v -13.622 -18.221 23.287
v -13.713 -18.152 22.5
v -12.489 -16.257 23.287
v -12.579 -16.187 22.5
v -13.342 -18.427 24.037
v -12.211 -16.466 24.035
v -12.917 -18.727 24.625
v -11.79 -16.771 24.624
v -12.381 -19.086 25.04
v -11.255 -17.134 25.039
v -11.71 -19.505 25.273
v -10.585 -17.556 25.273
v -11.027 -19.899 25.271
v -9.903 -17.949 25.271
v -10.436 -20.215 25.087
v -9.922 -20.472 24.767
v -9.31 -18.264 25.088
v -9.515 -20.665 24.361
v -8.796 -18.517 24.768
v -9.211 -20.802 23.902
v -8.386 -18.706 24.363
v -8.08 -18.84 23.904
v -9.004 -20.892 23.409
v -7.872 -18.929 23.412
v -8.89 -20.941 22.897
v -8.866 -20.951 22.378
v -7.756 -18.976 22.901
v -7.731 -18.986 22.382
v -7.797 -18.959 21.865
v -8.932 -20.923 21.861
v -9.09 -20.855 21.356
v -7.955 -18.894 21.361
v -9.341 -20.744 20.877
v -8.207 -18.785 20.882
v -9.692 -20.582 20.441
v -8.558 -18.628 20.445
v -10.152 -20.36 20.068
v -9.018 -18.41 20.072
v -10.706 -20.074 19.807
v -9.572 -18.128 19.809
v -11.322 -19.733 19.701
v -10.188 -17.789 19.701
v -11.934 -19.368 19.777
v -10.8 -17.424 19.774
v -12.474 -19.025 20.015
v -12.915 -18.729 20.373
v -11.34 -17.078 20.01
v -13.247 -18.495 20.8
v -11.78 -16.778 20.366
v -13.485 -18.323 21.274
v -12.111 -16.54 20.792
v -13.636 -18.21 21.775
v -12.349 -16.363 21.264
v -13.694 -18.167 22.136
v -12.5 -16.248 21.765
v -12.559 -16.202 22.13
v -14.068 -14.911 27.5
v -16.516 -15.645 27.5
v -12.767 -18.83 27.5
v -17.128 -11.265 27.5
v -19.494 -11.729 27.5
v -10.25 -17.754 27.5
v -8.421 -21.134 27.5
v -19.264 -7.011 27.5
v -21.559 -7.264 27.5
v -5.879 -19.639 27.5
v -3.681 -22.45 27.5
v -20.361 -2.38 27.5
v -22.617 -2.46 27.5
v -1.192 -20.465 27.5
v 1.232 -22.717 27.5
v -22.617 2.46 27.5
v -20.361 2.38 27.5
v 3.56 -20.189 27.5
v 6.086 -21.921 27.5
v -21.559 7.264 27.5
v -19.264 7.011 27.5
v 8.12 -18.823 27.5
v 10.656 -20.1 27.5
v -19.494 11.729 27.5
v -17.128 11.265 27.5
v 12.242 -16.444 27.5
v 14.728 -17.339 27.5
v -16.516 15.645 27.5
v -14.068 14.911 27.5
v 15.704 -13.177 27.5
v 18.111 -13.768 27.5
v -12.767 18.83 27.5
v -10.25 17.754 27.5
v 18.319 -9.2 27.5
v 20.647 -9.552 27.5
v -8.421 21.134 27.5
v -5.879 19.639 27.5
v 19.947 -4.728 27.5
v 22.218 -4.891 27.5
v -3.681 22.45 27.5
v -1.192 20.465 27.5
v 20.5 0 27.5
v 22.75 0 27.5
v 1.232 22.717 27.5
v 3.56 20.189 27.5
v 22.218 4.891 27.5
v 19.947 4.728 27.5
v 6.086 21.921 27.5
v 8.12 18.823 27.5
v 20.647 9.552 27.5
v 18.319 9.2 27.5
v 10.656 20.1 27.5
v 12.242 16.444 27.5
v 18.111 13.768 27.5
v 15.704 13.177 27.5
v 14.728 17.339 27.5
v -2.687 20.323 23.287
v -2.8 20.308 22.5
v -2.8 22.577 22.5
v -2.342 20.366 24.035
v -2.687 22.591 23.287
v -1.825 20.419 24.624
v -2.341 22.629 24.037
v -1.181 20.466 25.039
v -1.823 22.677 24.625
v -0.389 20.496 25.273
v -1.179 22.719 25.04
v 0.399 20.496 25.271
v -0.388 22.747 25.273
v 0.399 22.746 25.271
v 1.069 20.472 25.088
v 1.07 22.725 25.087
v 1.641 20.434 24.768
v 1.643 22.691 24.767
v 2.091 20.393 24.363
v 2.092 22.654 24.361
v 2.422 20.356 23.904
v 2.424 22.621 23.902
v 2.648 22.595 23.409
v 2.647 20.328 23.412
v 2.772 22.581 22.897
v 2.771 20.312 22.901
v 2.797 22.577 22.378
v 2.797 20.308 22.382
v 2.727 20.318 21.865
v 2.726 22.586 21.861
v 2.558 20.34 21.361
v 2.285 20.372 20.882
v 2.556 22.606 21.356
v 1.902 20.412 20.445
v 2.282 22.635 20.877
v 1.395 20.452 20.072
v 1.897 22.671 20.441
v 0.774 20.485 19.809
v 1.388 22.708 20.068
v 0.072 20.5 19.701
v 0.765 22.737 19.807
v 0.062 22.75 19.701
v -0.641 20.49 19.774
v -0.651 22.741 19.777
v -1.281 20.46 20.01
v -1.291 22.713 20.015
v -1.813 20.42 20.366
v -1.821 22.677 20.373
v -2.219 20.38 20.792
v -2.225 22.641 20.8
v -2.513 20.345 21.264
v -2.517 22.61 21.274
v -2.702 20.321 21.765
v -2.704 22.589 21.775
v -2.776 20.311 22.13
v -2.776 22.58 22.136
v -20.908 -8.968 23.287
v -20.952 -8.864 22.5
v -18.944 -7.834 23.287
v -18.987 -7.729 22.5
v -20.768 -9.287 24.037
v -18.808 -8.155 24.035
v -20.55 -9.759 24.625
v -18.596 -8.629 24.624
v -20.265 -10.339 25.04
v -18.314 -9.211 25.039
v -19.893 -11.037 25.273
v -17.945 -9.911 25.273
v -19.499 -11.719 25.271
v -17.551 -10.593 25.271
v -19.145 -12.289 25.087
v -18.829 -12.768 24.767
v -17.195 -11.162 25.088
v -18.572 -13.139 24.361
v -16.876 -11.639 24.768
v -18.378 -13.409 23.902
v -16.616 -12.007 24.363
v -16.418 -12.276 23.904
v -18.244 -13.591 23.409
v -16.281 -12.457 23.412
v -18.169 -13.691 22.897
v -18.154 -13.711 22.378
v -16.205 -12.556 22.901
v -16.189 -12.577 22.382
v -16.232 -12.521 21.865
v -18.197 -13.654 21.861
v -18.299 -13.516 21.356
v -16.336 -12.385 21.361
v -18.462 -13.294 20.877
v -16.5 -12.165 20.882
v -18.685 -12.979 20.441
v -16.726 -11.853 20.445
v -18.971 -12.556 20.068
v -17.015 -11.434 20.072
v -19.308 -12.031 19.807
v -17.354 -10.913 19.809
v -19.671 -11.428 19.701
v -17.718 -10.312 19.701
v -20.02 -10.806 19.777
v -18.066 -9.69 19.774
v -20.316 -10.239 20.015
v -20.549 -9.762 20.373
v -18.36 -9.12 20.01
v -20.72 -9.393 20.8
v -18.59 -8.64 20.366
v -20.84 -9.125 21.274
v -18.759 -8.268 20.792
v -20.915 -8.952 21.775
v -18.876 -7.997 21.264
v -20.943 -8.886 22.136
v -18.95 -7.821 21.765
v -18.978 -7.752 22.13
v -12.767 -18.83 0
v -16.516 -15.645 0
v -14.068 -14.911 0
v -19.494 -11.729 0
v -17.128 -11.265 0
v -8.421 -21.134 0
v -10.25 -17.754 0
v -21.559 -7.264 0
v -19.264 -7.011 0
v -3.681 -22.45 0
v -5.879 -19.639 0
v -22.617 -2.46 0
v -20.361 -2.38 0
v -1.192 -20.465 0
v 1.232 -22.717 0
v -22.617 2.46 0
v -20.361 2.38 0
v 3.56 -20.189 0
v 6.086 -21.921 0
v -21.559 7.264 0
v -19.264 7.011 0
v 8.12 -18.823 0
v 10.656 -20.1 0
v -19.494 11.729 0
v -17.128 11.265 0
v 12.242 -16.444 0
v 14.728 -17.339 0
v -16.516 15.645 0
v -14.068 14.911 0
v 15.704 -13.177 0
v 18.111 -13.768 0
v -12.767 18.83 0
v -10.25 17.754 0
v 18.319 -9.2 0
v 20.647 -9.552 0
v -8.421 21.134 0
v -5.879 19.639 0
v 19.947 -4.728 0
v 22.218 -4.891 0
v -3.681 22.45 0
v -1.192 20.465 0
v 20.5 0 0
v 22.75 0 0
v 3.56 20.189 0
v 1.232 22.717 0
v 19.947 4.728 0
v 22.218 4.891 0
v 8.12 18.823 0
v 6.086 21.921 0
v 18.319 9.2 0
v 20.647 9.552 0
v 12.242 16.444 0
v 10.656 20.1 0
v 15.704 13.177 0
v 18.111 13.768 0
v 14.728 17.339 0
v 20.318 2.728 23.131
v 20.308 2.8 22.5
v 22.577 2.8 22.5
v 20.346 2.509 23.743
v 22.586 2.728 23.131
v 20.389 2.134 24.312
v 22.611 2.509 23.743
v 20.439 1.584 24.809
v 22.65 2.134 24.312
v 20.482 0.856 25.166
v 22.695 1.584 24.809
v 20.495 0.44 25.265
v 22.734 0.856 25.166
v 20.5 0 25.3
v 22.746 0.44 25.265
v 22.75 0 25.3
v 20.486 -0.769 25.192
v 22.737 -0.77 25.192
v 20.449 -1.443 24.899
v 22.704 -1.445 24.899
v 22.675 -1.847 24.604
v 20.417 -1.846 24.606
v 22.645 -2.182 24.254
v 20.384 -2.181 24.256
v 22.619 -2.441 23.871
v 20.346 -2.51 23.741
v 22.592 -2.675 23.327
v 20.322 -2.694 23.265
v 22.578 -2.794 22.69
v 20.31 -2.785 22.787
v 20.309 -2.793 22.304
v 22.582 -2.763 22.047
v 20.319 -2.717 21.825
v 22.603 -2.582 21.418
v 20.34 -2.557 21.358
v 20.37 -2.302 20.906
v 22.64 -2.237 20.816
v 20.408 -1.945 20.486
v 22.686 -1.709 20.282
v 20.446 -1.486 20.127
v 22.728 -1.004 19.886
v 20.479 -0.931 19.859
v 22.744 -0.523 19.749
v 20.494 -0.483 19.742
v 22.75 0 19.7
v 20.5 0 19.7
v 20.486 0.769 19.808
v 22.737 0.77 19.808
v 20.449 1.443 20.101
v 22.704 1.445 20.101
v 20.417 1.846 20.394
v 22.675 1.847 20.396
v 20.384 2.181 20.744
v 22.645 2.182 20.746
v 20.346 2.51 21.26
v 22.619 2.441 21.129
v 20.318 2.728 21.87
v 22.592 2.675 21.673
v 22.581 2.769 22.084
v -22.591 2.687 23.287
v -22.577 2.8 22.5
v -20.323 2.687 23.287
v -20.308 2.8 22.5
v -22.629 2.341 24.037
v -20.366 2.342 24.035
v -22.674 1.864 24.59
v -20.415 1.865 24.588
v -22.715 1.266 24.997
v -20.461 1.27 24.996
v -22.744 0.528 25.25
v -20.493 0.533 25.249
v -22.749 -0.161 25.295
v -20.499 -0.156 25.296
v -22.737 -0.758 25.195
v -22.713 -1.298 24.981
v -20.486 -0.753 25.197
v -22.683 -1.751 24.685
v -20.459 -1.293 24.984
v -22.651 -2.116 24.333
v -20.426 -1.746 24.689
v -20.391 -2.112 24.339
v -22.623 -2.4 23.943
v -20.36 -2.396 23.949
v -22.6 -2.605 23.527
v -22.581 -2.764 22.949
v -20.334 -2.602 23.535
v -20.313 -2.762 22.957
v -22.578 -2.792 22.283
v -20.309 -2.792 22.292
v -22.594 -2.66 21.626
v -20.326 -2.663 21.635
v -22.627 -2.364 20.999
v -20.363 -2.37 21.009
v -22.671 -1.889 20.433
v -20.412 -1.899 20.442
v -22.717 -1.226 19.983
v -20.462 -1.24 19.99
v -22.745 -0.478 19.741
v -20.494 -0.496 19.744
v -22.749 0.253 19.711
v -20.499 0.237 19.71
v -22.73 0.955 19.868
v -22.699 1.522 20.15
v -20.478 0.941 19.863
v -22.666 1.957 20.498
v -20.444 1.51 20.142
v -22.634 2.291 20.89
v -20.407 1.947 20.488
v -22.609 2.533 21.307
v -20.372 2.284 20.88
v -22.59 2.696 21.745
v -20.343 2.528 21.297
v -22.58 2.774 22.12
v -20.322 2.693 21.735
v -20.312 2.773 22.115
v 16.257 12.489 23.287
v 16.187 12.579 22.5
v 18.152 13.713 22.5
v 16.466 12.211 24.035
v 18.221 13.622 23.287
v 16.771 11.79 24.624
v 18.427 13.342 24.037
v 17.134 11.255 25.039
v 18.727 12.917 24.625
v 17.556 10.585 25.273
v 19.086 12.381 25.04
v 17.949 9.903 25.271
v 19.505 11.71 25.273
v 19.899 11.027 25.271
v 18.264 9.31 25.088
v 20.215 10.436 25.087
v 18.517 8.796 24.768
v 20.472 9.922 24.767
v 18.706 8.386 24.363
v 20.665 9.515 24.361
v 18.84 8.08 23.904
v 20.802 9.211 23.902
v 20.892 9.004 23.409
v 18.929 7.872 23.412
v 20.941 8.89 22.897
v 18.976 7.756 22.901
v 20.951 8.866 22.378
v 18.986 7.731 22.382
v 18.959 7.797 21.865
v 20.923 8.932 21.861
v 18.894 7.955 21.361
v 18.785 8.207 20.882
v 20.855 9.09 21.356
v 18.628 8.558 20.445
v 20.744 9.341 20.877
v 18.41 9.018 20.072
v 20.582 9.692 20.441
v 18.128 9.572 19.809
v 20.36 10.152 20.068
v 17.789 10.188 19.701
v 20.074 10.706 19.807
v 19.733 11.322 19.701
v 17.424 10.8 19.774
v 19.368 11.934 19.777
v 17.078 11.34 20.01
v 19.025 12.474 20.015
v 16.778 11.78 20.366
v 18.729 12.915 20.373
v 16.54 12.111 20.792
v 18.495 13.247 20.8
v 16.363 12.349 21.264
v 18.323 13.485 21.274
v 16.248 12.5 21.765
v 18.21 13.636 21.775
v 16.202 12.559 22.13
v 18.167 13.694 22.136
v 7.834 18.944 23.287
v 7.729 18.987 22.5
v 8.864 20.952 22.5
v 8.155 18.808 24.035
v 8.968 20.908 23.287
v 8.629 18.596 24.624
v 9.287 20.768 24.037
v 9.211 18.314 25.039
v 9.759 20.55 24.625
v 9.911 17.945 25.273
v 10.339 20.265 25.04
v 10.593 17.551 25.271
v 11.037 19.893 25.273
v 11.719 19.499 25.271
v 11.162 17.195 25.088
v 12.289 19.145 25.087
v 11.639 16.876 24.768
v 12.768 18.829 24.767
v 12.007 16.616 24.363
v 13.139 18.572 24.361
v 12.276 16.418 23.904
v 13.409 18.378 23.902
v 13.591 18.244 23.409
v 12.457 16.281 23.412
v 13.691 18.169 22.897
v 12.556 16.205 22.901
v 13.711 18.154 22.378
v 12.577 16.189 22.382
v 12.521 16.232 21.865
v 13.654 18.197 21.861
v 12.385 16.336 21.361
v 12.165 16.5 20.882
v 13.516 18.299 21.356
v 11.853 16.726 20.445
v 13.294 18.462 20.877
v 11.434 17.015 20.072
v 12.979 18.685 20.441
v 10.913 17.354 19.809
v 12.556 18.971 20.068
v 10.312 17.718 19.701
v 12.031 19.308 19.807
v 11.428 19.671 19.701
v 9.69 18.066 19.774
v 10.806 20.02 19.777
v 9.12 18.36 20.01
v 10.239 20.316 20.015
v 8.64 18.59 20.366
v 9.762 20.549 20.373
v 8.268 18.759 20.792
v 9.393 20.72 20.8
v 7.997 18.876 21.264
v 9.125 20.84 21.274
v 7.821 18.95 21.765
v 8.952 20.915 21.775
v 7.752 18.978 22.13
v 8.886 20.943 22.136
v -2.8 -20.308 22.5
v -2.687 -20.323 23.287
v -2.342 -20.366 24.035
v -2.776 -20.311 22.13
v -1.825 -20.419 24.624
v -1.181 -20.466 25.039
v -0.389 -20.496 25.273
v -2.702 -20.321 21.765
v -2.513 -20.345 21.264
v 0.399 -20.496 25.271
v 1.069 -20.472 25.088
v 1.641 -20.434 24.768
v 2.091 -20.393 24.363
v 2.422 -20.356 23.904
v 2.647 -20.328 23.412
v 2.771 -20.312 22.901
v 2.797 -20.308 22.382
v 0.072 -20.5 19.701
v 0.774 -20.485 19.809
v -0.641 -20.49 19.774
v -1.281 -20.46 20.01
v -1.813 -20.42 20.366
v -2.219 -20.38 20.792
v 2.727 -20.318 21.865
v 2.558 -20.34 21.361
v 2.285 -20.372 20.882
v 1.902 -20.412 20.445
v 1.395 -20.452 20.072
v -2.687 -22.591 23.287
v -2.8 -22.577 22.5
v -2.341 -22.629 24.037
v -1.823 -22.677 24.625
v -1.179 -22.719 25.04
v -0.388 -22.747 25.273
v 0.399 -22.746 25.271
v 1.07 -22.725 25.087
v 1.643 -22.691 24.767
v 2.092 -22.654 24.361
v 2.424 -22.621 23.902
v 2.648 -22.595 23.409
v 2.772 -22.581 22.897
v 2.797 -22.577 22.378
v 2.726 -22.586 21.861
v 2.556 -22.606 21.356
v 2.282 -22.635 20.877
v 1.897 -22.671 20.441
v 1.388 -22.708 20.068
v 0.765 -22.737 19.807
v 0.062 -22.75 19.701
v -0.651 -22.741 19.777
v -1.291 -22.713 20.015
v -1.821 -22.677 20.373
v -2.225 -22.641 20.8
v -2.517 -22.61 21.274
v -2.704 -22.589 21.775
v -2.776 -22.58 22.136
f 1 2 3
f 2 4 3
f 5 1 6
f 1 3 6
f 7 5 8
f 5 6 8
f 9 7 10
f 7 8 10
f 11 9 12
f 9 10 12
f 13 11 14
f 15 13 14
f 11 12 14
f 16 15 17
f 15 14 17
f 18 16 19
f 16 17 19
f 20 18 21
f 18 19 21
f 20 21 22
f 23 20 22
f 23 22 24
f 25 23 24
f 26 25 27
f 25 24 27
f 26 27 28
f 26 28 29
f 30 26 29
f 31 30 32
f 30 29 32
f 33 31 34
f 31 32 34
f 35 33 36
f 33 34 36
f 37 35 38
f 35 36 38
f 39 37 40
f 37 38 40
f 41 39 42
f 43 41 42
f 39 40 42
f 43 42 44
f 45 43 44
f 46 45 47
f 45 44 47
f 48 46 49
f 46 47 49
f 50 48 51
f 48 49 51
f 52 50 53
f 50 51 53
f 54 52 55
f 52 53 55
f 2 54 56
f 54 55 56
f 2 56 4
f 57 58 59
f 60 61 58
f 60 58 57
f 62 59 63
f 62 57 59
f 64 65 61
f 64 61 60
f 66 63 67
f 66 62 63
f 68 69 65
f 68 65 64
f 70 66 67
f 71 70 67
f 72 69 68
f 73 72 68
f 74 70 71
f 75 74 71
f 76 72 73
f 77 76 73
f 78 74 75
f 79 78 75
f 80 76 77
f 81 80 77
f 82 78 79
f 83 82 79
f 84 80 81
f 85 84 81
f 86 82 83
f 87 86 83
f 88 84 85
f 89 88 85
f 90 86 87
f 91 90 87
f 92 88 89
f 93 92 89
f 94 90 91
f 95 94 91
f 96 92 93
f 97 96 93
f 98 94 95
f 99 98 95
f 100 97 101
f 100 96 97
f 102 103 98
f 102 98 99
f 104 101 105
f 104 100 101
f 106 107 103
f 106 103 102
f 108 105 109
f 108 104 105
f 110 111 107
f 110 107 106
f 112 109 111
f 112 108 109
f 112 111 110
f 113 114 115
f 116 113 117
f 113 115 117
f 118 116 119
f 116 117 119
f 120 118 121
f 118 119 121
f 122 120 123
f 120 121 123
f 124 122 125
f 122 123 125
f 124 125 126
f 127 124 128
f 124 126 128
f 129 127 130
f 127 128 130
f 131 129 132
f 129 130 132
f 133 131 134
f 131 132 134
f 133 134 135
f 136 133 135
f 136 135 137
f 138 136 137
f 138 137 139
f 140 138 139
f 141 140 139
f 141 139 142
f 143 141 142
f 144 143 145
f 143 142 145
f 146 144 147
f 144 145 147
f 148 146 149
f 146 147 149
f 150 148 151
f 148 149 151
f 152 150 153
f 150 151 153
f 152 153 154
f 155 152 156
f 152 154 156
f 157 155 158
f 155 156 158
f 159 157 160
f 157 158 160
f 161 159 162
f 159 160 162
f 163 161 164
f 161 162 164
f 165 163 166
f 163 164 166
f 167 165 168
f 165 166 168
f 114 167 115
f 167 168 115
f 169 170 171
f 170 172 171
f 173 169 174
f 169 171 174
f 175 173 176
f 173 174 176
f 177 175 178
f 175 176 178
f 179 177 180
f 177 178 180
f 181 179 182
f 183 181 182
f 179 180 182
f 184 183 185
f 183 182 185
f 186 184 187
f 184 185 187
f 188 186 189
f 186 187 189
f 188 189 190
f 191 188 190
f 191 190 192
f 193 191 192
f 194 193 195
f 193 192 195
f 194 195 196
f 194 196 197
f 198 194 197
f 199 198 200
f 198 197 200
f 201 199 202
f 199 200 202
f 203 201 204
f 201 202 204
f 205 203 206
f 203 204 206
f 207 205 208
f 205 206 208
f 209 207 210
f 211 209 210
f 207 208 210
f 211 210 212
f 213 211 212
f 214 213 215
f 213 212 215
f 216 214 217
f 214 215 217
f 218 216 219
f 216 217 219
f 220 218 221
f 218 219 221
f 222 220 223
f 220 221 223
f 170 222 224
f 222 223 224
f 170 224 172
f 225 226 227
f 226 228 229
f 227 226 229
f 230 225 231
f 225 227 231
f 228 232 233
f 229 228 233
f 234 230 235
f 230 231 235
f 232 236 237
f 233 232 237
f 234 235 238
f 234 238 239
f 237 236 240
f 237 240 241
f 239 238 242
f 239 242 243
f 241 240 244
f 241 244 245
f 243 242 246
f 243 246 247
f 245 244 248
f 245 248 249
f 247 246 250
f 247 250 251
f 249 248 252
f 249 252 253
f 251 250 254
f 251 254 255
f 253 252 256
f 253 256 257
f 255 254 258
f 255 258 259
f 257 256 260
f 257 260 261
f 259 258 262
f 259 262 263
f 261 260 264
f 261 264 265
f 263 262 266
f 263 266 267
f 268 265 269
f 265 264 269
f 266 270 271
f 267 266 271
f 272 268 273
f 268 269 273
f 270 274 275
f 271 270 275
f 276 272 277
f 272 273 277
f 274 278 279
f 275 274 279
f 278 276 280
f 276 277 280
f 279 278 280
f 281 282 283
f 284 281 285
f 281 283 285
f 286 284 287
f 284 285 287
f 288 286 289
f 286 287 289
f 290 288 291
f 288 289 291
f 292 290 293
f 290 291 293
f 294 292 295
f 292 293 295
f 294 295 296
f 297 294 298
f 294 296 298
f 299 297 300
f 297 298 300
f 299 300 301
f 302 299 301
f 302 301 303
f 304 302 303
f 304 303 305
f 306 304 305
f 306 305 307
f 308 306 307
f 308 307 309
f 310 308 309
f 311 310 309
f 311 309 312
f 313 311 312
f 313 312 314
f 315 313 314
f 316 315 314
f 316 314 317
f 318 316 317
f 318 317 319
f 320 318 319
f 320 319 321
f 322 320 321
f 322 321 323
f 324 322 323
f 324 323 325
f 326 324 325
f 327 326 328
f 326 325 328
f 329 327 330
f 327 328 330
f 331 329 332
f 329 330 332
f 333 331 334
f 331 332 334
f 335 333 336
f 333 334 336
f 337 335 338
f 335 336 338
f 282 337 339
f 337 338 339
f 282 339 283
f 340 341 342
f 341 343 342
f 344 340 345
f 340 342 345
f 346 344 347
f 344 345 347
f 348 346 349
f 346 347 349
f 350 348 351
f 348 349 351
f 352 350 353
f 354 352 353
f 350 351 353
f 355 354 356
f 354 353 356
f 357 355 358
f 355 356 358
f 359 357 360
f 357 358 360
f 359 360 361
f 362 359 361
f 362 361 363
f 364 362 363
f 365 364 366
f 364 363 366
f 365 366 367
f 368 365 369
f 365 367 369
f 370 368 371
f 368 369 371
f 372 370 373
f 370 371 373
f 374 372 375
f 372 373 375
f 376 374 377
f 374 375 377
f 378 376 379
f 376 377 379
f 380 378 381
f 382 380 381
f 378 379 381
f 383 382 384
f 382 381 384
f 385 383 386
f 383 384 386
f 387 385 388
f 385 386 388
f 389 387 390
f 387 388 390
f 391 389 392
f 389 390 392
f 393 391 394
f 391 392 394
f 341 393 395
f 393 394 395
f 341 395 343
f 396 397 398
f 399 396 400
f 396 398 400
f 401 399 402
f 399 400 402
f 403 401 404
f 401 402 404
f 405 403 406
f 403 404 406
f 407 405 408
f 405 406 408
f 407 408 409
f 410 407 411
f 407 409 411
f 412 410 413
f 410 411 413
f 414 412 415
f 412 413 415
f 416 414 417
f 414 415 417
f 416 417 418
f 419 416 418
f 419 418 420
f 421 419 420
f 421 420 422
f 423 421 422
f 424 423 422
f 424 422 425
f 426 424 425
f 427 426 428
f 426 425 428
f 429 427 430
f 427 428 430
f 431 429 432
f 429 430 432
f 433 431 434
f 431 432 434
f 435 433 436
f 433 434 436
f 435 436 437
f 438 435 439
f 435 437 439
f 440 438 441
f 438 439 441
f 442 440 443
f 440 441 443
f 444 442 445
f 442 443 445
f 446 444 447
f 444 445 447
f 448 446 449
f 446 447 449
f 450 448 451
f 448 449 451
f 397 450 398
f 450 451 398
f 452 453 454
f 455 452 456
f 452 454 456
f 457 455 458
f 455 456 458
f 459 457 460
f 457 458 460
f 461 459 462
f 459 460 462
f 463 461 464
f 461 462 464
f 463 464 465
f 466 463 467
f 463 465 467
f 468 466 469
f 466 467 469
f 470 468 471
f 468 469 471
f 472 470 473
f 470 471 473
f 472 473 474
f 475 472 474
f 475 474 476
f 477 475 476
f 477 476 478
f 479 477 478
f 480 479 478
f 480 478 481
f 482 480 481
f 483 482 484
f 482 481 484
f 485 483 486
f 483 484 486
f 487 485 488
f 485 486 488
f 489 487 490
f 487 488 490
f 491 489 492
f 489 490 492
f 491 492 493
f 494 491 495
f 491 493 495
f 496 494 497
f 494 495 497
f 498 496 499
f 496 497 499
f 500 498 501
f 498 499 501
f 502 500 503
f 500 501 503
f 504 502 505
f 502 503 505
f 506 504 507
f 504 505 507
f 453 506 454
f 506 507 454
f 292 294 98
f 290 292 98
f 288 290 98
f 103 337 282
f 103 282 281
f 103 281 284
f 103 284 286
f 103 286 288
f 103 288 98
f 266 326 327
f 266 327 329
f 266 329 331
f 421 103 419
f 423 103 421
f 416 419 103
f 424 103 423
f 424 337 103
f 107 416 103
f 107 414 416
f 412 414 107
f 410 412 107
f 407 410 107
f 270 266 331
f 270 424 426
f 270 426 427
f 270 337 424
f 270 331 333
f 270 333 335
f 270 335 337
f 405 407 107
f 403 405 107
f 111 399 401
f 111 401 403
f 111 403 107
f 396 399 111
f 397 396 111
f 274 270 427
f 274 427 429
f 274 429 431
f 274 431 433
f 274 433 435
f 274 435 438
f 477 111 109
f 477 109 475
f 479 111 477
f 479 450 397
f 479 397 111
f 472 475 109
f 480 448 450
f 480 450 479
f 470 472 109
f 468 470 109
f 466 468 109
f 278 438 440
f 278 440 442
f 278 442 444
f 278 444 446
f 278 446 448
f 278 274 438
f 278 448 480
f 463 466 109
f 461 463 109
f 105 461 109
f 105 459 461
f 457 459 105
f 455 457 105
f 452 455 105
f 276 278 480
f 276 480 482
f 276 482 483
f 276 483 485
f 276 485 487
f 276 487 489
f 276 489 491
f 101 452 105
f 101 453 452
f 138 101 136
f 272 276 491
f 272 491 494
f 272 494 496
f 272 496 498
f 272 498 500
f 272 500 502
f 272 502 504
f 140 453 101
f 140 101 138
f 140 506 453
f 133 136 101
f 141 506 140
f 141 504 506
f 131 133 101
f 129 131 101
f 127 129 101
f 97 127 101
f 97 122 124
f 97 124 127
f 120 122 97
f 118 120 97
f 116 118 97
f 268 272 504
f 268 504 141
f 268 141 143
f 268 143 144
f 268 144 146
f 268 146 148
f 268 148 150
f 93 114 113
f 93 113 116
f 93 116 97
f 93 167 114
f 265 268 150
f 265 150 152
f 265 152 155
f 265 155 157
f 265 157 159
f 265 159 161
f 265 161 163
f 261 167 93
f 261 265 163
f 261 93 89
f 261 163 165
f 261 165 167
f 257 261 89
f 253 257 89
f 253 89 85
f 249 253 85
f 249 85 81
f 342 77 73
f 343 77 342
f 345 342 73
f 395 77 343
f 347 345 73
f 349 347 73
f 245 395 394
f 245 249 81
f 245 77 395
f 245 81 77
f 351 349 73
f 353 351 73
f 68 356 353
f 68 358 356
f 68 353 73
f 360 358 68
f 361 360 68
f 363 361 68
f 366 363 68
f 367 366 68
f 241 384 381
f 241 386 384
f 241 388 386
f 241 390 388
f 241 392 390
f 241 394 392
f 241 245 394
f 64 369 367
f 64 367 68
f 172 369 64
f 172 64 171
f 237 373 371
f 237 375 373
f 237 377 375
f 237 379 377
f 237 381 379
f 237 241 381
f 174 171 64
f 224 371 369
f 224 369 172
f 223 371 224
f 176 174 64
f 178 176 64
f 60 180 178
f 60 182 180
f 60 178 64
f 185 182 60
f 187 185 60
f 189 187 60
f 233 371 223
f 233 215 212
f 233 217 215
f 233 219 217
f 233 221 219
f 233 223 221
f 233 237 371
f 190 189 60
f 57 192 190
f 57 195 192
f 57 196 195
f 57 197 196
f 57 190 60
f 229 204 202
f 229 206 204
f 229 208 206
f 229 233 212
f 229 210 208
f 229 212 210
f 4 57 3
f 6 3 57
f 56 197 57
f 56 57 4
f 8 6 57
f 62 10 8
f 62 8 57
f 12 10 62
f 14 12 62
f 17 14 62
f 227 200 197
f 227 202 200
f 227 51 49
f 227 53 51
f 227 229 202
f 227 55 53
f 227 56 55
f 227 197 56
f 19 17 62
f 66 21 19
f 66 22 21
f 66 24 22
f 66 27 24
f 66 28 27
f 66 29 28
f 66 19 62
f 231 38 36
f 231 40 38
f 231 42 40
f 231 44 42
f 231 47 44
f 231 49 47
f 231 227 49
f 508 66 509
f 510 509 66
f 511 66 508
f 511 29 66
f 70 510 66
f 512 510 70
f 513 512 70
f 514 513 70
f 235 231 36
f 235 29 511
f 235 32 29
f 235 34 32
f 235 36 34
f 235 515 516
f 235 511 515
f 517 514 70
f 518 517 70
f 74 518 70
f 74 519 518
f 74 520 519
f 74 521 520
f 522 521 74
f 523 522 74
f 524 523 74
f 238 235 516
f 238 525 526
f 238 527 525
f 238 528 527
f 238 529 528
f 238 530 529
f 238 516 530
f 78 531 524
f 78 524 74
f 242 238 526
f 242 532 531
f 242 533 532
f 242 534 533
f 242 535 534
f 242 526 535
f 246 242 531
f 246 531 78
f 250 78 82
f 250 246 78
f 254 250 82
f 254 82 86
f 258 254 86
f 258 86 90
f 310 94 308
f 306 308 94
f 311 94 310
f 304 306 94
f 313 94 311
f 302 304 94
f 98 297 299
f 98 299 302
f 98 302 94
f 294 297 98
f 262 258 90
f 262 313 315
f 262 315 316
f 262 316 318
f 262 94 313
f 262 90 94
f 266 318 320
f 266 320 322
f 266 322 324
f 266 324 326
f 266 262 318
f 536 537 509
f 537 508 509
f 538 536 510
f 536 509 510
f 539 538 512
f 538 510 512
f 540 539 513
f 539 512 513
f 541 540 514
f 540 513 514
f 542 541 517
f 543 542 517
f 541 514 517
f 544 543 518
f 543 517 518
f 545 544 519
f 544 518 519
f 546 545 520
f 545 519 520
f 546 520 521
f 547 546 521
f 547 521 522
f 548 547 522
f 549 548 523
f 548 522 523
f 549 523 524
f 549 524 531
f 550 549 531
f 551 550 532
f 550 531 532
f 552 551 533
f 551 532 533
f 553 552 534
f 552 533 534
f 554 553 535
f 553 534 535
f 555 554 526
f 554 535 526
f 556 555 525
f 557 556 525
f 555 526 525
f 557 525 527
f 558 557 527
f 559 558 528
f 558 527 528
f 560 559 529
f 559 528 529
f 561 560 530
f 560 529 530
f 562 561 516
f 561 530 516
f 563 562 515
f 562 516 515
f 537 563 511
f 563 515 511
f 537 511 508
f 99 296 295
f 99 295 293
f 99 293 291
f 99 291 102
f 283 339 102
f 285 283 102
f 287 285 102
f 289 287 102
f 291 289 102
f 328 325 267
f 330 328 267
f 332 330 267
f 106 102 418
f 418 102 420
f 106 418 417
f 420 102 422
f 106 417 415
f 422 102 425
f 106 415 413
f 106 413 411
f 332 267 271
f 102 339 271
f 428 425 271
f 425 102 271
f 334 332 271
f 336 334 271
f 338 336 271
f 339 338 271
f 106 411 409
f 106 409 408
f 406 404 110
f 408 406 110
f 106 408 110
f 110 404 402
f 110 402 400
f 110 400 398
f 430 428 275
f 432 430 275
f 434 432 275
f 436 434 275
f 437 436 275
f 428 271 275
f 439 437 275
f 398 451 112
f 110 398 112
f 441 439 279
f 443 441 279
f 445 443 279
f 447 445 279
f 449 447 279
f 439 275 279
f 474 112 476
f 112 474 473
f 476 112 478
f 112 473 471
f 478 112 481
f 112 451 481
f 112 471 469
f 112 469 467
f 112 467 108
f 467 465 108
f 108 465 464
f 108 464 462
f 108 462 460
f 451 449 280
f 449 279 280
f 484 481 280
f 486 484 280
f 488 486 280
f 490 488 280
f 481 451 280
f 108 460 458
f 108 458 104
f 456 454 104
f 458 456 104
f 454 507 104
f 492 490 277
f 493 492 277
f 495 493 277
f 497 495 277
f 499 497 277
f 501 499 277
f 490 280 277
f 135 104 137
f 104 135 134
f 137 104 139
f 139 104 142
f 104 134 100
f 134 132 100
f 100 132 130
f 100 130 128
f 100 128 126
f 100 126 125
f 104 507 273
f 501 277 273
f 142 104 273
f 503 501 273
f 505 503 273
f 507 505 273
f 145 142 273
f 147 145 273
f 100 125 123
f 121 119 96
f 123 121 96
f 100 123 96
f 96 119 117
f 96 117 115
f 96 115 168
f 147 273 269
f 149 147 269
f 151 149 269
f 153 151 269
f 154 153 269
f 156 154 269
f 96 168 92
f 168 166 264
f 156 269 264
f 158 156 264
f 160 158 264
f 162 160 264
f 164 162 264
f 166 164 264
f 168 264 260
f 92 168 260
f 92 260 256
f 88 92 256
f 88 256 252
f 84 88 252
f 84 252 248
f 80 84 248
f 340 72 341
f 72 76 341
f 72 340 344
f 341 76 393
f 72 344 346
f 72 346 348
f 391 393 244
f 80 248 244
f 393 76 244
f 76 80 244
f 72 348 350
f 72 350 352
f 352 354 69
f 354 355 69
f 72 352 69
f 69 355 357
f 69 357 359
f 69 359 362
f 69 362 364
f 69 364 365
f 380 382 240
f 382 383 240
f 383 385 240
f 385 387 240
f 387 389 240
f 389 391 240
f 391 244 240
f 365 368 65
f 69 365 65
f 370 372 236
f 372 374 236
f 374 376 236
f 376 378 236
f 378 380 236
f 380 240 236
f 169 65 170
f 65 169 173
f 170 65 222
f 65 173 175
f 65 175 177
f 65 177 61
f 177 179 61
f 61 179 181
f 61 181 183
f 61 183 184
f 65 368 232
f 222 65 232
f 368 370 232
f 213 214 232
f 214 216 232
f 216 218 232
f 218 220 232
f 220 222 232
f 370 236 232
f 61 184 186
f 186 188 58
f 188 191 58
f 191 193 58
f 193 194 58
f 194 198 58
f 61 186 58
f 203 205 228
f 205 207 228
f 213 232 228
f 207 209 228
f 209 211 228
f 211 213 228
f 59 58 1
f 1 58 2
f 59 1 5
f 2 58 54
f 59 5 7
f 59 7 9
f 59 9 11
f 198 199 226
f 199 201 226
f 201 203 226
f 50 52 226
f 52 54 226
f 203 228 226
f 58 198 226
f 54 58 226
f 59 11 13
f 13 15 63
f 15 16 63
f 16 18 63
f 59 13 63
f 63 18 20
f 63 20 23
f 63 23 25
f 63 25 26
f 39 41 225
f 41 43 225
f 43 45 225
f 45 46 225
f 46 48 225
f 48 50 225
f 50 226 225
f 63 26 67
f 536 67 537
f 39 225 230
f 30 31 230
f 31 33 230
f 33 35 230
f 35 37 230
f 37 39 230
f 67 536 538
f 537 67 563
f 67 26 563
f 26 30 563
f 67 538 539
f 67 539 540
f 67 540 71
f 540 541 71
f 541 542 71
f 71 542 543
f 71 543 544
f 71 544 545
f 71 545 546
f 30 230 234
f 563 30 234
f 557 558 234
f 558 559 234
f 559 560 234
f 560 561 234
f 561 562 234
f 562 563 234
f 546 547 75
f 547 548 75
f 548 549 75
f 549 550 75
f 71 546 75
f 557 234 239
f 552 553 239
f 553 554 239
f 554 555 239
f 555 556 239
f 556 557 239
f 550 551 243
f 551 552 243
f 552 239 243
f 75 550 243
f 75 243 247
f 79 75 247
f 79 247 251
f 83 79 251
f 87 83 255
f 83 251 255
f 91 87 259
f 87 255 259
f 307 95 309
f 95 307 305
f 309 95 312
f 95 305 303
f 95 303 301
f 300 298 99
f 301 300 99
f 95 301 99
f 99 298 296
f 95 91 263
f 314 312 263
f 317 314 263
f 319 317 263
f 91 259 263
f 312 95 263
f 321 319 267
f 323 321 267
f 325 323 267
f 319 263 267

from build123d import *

# Parameters (mm, degrees)
F0_R     = 22.75
F0_R_2   = 20.5
F1_DEPTH = 27.5
F2_R     = 2.8
F3_DEPTH = 25
F4_COUNT = 4
F4_ANGLE = 90


with BuildPart() as f1:
    # F0 (on Top) → F1 (new body)
    with BuildSketch(Plane.XY):
        Circle(F0_R)
        Circle(F0_R_2, mode=Mode.SUBTRACT)
    extrude(amount=F1_DEPTH)


with BuildPart() as f3:
    # F2 (on Right) → F3 (new body, symmetric)
    with BuildSketch(Plane.YZ):
        with Locations((0, 22.5)):
            Circle(F2_R)
    extrude(amount=F3_DEPTH, both=True)


with BuildPart() as f4_1:
    # F4: instance of F3
    add(f3.part.rotate(Axis((0, 0, 0), (0, 0, 1)), 1 * F4_ANGLE / (F4_COUNT - 1)))


with BuildPart() as f4_2:
    # F4: instance of F3
    add(f3.part.rotate(Axis((0, 0, 0), (0, 0, 1)), 2 * F4_ANGLE / (F4_COUNT - 1)))


with BuildPart() as f4_3:
    # F4: instance of F3
    add(f3.part.rotate(Axis((0, 0, 0), (0, 0, 1)), 3 * F4_ANGLE / (F4_COUNT - 1)))


with BuildPart() as f1_1:
    add(f1.part)

    # F5: cut F4_3, F4_2, F4_1, F3
    add(f4_3.part, mode=Mode.SUBTRACT)
    add(f4_2.part, mode=Mode.SUBTRACT)
    add(f4_1.part, mode=Mode.SUBTRACT)
    add(f3.part, mode=Mode.SUBTRACT)


solid = f1_1.part
